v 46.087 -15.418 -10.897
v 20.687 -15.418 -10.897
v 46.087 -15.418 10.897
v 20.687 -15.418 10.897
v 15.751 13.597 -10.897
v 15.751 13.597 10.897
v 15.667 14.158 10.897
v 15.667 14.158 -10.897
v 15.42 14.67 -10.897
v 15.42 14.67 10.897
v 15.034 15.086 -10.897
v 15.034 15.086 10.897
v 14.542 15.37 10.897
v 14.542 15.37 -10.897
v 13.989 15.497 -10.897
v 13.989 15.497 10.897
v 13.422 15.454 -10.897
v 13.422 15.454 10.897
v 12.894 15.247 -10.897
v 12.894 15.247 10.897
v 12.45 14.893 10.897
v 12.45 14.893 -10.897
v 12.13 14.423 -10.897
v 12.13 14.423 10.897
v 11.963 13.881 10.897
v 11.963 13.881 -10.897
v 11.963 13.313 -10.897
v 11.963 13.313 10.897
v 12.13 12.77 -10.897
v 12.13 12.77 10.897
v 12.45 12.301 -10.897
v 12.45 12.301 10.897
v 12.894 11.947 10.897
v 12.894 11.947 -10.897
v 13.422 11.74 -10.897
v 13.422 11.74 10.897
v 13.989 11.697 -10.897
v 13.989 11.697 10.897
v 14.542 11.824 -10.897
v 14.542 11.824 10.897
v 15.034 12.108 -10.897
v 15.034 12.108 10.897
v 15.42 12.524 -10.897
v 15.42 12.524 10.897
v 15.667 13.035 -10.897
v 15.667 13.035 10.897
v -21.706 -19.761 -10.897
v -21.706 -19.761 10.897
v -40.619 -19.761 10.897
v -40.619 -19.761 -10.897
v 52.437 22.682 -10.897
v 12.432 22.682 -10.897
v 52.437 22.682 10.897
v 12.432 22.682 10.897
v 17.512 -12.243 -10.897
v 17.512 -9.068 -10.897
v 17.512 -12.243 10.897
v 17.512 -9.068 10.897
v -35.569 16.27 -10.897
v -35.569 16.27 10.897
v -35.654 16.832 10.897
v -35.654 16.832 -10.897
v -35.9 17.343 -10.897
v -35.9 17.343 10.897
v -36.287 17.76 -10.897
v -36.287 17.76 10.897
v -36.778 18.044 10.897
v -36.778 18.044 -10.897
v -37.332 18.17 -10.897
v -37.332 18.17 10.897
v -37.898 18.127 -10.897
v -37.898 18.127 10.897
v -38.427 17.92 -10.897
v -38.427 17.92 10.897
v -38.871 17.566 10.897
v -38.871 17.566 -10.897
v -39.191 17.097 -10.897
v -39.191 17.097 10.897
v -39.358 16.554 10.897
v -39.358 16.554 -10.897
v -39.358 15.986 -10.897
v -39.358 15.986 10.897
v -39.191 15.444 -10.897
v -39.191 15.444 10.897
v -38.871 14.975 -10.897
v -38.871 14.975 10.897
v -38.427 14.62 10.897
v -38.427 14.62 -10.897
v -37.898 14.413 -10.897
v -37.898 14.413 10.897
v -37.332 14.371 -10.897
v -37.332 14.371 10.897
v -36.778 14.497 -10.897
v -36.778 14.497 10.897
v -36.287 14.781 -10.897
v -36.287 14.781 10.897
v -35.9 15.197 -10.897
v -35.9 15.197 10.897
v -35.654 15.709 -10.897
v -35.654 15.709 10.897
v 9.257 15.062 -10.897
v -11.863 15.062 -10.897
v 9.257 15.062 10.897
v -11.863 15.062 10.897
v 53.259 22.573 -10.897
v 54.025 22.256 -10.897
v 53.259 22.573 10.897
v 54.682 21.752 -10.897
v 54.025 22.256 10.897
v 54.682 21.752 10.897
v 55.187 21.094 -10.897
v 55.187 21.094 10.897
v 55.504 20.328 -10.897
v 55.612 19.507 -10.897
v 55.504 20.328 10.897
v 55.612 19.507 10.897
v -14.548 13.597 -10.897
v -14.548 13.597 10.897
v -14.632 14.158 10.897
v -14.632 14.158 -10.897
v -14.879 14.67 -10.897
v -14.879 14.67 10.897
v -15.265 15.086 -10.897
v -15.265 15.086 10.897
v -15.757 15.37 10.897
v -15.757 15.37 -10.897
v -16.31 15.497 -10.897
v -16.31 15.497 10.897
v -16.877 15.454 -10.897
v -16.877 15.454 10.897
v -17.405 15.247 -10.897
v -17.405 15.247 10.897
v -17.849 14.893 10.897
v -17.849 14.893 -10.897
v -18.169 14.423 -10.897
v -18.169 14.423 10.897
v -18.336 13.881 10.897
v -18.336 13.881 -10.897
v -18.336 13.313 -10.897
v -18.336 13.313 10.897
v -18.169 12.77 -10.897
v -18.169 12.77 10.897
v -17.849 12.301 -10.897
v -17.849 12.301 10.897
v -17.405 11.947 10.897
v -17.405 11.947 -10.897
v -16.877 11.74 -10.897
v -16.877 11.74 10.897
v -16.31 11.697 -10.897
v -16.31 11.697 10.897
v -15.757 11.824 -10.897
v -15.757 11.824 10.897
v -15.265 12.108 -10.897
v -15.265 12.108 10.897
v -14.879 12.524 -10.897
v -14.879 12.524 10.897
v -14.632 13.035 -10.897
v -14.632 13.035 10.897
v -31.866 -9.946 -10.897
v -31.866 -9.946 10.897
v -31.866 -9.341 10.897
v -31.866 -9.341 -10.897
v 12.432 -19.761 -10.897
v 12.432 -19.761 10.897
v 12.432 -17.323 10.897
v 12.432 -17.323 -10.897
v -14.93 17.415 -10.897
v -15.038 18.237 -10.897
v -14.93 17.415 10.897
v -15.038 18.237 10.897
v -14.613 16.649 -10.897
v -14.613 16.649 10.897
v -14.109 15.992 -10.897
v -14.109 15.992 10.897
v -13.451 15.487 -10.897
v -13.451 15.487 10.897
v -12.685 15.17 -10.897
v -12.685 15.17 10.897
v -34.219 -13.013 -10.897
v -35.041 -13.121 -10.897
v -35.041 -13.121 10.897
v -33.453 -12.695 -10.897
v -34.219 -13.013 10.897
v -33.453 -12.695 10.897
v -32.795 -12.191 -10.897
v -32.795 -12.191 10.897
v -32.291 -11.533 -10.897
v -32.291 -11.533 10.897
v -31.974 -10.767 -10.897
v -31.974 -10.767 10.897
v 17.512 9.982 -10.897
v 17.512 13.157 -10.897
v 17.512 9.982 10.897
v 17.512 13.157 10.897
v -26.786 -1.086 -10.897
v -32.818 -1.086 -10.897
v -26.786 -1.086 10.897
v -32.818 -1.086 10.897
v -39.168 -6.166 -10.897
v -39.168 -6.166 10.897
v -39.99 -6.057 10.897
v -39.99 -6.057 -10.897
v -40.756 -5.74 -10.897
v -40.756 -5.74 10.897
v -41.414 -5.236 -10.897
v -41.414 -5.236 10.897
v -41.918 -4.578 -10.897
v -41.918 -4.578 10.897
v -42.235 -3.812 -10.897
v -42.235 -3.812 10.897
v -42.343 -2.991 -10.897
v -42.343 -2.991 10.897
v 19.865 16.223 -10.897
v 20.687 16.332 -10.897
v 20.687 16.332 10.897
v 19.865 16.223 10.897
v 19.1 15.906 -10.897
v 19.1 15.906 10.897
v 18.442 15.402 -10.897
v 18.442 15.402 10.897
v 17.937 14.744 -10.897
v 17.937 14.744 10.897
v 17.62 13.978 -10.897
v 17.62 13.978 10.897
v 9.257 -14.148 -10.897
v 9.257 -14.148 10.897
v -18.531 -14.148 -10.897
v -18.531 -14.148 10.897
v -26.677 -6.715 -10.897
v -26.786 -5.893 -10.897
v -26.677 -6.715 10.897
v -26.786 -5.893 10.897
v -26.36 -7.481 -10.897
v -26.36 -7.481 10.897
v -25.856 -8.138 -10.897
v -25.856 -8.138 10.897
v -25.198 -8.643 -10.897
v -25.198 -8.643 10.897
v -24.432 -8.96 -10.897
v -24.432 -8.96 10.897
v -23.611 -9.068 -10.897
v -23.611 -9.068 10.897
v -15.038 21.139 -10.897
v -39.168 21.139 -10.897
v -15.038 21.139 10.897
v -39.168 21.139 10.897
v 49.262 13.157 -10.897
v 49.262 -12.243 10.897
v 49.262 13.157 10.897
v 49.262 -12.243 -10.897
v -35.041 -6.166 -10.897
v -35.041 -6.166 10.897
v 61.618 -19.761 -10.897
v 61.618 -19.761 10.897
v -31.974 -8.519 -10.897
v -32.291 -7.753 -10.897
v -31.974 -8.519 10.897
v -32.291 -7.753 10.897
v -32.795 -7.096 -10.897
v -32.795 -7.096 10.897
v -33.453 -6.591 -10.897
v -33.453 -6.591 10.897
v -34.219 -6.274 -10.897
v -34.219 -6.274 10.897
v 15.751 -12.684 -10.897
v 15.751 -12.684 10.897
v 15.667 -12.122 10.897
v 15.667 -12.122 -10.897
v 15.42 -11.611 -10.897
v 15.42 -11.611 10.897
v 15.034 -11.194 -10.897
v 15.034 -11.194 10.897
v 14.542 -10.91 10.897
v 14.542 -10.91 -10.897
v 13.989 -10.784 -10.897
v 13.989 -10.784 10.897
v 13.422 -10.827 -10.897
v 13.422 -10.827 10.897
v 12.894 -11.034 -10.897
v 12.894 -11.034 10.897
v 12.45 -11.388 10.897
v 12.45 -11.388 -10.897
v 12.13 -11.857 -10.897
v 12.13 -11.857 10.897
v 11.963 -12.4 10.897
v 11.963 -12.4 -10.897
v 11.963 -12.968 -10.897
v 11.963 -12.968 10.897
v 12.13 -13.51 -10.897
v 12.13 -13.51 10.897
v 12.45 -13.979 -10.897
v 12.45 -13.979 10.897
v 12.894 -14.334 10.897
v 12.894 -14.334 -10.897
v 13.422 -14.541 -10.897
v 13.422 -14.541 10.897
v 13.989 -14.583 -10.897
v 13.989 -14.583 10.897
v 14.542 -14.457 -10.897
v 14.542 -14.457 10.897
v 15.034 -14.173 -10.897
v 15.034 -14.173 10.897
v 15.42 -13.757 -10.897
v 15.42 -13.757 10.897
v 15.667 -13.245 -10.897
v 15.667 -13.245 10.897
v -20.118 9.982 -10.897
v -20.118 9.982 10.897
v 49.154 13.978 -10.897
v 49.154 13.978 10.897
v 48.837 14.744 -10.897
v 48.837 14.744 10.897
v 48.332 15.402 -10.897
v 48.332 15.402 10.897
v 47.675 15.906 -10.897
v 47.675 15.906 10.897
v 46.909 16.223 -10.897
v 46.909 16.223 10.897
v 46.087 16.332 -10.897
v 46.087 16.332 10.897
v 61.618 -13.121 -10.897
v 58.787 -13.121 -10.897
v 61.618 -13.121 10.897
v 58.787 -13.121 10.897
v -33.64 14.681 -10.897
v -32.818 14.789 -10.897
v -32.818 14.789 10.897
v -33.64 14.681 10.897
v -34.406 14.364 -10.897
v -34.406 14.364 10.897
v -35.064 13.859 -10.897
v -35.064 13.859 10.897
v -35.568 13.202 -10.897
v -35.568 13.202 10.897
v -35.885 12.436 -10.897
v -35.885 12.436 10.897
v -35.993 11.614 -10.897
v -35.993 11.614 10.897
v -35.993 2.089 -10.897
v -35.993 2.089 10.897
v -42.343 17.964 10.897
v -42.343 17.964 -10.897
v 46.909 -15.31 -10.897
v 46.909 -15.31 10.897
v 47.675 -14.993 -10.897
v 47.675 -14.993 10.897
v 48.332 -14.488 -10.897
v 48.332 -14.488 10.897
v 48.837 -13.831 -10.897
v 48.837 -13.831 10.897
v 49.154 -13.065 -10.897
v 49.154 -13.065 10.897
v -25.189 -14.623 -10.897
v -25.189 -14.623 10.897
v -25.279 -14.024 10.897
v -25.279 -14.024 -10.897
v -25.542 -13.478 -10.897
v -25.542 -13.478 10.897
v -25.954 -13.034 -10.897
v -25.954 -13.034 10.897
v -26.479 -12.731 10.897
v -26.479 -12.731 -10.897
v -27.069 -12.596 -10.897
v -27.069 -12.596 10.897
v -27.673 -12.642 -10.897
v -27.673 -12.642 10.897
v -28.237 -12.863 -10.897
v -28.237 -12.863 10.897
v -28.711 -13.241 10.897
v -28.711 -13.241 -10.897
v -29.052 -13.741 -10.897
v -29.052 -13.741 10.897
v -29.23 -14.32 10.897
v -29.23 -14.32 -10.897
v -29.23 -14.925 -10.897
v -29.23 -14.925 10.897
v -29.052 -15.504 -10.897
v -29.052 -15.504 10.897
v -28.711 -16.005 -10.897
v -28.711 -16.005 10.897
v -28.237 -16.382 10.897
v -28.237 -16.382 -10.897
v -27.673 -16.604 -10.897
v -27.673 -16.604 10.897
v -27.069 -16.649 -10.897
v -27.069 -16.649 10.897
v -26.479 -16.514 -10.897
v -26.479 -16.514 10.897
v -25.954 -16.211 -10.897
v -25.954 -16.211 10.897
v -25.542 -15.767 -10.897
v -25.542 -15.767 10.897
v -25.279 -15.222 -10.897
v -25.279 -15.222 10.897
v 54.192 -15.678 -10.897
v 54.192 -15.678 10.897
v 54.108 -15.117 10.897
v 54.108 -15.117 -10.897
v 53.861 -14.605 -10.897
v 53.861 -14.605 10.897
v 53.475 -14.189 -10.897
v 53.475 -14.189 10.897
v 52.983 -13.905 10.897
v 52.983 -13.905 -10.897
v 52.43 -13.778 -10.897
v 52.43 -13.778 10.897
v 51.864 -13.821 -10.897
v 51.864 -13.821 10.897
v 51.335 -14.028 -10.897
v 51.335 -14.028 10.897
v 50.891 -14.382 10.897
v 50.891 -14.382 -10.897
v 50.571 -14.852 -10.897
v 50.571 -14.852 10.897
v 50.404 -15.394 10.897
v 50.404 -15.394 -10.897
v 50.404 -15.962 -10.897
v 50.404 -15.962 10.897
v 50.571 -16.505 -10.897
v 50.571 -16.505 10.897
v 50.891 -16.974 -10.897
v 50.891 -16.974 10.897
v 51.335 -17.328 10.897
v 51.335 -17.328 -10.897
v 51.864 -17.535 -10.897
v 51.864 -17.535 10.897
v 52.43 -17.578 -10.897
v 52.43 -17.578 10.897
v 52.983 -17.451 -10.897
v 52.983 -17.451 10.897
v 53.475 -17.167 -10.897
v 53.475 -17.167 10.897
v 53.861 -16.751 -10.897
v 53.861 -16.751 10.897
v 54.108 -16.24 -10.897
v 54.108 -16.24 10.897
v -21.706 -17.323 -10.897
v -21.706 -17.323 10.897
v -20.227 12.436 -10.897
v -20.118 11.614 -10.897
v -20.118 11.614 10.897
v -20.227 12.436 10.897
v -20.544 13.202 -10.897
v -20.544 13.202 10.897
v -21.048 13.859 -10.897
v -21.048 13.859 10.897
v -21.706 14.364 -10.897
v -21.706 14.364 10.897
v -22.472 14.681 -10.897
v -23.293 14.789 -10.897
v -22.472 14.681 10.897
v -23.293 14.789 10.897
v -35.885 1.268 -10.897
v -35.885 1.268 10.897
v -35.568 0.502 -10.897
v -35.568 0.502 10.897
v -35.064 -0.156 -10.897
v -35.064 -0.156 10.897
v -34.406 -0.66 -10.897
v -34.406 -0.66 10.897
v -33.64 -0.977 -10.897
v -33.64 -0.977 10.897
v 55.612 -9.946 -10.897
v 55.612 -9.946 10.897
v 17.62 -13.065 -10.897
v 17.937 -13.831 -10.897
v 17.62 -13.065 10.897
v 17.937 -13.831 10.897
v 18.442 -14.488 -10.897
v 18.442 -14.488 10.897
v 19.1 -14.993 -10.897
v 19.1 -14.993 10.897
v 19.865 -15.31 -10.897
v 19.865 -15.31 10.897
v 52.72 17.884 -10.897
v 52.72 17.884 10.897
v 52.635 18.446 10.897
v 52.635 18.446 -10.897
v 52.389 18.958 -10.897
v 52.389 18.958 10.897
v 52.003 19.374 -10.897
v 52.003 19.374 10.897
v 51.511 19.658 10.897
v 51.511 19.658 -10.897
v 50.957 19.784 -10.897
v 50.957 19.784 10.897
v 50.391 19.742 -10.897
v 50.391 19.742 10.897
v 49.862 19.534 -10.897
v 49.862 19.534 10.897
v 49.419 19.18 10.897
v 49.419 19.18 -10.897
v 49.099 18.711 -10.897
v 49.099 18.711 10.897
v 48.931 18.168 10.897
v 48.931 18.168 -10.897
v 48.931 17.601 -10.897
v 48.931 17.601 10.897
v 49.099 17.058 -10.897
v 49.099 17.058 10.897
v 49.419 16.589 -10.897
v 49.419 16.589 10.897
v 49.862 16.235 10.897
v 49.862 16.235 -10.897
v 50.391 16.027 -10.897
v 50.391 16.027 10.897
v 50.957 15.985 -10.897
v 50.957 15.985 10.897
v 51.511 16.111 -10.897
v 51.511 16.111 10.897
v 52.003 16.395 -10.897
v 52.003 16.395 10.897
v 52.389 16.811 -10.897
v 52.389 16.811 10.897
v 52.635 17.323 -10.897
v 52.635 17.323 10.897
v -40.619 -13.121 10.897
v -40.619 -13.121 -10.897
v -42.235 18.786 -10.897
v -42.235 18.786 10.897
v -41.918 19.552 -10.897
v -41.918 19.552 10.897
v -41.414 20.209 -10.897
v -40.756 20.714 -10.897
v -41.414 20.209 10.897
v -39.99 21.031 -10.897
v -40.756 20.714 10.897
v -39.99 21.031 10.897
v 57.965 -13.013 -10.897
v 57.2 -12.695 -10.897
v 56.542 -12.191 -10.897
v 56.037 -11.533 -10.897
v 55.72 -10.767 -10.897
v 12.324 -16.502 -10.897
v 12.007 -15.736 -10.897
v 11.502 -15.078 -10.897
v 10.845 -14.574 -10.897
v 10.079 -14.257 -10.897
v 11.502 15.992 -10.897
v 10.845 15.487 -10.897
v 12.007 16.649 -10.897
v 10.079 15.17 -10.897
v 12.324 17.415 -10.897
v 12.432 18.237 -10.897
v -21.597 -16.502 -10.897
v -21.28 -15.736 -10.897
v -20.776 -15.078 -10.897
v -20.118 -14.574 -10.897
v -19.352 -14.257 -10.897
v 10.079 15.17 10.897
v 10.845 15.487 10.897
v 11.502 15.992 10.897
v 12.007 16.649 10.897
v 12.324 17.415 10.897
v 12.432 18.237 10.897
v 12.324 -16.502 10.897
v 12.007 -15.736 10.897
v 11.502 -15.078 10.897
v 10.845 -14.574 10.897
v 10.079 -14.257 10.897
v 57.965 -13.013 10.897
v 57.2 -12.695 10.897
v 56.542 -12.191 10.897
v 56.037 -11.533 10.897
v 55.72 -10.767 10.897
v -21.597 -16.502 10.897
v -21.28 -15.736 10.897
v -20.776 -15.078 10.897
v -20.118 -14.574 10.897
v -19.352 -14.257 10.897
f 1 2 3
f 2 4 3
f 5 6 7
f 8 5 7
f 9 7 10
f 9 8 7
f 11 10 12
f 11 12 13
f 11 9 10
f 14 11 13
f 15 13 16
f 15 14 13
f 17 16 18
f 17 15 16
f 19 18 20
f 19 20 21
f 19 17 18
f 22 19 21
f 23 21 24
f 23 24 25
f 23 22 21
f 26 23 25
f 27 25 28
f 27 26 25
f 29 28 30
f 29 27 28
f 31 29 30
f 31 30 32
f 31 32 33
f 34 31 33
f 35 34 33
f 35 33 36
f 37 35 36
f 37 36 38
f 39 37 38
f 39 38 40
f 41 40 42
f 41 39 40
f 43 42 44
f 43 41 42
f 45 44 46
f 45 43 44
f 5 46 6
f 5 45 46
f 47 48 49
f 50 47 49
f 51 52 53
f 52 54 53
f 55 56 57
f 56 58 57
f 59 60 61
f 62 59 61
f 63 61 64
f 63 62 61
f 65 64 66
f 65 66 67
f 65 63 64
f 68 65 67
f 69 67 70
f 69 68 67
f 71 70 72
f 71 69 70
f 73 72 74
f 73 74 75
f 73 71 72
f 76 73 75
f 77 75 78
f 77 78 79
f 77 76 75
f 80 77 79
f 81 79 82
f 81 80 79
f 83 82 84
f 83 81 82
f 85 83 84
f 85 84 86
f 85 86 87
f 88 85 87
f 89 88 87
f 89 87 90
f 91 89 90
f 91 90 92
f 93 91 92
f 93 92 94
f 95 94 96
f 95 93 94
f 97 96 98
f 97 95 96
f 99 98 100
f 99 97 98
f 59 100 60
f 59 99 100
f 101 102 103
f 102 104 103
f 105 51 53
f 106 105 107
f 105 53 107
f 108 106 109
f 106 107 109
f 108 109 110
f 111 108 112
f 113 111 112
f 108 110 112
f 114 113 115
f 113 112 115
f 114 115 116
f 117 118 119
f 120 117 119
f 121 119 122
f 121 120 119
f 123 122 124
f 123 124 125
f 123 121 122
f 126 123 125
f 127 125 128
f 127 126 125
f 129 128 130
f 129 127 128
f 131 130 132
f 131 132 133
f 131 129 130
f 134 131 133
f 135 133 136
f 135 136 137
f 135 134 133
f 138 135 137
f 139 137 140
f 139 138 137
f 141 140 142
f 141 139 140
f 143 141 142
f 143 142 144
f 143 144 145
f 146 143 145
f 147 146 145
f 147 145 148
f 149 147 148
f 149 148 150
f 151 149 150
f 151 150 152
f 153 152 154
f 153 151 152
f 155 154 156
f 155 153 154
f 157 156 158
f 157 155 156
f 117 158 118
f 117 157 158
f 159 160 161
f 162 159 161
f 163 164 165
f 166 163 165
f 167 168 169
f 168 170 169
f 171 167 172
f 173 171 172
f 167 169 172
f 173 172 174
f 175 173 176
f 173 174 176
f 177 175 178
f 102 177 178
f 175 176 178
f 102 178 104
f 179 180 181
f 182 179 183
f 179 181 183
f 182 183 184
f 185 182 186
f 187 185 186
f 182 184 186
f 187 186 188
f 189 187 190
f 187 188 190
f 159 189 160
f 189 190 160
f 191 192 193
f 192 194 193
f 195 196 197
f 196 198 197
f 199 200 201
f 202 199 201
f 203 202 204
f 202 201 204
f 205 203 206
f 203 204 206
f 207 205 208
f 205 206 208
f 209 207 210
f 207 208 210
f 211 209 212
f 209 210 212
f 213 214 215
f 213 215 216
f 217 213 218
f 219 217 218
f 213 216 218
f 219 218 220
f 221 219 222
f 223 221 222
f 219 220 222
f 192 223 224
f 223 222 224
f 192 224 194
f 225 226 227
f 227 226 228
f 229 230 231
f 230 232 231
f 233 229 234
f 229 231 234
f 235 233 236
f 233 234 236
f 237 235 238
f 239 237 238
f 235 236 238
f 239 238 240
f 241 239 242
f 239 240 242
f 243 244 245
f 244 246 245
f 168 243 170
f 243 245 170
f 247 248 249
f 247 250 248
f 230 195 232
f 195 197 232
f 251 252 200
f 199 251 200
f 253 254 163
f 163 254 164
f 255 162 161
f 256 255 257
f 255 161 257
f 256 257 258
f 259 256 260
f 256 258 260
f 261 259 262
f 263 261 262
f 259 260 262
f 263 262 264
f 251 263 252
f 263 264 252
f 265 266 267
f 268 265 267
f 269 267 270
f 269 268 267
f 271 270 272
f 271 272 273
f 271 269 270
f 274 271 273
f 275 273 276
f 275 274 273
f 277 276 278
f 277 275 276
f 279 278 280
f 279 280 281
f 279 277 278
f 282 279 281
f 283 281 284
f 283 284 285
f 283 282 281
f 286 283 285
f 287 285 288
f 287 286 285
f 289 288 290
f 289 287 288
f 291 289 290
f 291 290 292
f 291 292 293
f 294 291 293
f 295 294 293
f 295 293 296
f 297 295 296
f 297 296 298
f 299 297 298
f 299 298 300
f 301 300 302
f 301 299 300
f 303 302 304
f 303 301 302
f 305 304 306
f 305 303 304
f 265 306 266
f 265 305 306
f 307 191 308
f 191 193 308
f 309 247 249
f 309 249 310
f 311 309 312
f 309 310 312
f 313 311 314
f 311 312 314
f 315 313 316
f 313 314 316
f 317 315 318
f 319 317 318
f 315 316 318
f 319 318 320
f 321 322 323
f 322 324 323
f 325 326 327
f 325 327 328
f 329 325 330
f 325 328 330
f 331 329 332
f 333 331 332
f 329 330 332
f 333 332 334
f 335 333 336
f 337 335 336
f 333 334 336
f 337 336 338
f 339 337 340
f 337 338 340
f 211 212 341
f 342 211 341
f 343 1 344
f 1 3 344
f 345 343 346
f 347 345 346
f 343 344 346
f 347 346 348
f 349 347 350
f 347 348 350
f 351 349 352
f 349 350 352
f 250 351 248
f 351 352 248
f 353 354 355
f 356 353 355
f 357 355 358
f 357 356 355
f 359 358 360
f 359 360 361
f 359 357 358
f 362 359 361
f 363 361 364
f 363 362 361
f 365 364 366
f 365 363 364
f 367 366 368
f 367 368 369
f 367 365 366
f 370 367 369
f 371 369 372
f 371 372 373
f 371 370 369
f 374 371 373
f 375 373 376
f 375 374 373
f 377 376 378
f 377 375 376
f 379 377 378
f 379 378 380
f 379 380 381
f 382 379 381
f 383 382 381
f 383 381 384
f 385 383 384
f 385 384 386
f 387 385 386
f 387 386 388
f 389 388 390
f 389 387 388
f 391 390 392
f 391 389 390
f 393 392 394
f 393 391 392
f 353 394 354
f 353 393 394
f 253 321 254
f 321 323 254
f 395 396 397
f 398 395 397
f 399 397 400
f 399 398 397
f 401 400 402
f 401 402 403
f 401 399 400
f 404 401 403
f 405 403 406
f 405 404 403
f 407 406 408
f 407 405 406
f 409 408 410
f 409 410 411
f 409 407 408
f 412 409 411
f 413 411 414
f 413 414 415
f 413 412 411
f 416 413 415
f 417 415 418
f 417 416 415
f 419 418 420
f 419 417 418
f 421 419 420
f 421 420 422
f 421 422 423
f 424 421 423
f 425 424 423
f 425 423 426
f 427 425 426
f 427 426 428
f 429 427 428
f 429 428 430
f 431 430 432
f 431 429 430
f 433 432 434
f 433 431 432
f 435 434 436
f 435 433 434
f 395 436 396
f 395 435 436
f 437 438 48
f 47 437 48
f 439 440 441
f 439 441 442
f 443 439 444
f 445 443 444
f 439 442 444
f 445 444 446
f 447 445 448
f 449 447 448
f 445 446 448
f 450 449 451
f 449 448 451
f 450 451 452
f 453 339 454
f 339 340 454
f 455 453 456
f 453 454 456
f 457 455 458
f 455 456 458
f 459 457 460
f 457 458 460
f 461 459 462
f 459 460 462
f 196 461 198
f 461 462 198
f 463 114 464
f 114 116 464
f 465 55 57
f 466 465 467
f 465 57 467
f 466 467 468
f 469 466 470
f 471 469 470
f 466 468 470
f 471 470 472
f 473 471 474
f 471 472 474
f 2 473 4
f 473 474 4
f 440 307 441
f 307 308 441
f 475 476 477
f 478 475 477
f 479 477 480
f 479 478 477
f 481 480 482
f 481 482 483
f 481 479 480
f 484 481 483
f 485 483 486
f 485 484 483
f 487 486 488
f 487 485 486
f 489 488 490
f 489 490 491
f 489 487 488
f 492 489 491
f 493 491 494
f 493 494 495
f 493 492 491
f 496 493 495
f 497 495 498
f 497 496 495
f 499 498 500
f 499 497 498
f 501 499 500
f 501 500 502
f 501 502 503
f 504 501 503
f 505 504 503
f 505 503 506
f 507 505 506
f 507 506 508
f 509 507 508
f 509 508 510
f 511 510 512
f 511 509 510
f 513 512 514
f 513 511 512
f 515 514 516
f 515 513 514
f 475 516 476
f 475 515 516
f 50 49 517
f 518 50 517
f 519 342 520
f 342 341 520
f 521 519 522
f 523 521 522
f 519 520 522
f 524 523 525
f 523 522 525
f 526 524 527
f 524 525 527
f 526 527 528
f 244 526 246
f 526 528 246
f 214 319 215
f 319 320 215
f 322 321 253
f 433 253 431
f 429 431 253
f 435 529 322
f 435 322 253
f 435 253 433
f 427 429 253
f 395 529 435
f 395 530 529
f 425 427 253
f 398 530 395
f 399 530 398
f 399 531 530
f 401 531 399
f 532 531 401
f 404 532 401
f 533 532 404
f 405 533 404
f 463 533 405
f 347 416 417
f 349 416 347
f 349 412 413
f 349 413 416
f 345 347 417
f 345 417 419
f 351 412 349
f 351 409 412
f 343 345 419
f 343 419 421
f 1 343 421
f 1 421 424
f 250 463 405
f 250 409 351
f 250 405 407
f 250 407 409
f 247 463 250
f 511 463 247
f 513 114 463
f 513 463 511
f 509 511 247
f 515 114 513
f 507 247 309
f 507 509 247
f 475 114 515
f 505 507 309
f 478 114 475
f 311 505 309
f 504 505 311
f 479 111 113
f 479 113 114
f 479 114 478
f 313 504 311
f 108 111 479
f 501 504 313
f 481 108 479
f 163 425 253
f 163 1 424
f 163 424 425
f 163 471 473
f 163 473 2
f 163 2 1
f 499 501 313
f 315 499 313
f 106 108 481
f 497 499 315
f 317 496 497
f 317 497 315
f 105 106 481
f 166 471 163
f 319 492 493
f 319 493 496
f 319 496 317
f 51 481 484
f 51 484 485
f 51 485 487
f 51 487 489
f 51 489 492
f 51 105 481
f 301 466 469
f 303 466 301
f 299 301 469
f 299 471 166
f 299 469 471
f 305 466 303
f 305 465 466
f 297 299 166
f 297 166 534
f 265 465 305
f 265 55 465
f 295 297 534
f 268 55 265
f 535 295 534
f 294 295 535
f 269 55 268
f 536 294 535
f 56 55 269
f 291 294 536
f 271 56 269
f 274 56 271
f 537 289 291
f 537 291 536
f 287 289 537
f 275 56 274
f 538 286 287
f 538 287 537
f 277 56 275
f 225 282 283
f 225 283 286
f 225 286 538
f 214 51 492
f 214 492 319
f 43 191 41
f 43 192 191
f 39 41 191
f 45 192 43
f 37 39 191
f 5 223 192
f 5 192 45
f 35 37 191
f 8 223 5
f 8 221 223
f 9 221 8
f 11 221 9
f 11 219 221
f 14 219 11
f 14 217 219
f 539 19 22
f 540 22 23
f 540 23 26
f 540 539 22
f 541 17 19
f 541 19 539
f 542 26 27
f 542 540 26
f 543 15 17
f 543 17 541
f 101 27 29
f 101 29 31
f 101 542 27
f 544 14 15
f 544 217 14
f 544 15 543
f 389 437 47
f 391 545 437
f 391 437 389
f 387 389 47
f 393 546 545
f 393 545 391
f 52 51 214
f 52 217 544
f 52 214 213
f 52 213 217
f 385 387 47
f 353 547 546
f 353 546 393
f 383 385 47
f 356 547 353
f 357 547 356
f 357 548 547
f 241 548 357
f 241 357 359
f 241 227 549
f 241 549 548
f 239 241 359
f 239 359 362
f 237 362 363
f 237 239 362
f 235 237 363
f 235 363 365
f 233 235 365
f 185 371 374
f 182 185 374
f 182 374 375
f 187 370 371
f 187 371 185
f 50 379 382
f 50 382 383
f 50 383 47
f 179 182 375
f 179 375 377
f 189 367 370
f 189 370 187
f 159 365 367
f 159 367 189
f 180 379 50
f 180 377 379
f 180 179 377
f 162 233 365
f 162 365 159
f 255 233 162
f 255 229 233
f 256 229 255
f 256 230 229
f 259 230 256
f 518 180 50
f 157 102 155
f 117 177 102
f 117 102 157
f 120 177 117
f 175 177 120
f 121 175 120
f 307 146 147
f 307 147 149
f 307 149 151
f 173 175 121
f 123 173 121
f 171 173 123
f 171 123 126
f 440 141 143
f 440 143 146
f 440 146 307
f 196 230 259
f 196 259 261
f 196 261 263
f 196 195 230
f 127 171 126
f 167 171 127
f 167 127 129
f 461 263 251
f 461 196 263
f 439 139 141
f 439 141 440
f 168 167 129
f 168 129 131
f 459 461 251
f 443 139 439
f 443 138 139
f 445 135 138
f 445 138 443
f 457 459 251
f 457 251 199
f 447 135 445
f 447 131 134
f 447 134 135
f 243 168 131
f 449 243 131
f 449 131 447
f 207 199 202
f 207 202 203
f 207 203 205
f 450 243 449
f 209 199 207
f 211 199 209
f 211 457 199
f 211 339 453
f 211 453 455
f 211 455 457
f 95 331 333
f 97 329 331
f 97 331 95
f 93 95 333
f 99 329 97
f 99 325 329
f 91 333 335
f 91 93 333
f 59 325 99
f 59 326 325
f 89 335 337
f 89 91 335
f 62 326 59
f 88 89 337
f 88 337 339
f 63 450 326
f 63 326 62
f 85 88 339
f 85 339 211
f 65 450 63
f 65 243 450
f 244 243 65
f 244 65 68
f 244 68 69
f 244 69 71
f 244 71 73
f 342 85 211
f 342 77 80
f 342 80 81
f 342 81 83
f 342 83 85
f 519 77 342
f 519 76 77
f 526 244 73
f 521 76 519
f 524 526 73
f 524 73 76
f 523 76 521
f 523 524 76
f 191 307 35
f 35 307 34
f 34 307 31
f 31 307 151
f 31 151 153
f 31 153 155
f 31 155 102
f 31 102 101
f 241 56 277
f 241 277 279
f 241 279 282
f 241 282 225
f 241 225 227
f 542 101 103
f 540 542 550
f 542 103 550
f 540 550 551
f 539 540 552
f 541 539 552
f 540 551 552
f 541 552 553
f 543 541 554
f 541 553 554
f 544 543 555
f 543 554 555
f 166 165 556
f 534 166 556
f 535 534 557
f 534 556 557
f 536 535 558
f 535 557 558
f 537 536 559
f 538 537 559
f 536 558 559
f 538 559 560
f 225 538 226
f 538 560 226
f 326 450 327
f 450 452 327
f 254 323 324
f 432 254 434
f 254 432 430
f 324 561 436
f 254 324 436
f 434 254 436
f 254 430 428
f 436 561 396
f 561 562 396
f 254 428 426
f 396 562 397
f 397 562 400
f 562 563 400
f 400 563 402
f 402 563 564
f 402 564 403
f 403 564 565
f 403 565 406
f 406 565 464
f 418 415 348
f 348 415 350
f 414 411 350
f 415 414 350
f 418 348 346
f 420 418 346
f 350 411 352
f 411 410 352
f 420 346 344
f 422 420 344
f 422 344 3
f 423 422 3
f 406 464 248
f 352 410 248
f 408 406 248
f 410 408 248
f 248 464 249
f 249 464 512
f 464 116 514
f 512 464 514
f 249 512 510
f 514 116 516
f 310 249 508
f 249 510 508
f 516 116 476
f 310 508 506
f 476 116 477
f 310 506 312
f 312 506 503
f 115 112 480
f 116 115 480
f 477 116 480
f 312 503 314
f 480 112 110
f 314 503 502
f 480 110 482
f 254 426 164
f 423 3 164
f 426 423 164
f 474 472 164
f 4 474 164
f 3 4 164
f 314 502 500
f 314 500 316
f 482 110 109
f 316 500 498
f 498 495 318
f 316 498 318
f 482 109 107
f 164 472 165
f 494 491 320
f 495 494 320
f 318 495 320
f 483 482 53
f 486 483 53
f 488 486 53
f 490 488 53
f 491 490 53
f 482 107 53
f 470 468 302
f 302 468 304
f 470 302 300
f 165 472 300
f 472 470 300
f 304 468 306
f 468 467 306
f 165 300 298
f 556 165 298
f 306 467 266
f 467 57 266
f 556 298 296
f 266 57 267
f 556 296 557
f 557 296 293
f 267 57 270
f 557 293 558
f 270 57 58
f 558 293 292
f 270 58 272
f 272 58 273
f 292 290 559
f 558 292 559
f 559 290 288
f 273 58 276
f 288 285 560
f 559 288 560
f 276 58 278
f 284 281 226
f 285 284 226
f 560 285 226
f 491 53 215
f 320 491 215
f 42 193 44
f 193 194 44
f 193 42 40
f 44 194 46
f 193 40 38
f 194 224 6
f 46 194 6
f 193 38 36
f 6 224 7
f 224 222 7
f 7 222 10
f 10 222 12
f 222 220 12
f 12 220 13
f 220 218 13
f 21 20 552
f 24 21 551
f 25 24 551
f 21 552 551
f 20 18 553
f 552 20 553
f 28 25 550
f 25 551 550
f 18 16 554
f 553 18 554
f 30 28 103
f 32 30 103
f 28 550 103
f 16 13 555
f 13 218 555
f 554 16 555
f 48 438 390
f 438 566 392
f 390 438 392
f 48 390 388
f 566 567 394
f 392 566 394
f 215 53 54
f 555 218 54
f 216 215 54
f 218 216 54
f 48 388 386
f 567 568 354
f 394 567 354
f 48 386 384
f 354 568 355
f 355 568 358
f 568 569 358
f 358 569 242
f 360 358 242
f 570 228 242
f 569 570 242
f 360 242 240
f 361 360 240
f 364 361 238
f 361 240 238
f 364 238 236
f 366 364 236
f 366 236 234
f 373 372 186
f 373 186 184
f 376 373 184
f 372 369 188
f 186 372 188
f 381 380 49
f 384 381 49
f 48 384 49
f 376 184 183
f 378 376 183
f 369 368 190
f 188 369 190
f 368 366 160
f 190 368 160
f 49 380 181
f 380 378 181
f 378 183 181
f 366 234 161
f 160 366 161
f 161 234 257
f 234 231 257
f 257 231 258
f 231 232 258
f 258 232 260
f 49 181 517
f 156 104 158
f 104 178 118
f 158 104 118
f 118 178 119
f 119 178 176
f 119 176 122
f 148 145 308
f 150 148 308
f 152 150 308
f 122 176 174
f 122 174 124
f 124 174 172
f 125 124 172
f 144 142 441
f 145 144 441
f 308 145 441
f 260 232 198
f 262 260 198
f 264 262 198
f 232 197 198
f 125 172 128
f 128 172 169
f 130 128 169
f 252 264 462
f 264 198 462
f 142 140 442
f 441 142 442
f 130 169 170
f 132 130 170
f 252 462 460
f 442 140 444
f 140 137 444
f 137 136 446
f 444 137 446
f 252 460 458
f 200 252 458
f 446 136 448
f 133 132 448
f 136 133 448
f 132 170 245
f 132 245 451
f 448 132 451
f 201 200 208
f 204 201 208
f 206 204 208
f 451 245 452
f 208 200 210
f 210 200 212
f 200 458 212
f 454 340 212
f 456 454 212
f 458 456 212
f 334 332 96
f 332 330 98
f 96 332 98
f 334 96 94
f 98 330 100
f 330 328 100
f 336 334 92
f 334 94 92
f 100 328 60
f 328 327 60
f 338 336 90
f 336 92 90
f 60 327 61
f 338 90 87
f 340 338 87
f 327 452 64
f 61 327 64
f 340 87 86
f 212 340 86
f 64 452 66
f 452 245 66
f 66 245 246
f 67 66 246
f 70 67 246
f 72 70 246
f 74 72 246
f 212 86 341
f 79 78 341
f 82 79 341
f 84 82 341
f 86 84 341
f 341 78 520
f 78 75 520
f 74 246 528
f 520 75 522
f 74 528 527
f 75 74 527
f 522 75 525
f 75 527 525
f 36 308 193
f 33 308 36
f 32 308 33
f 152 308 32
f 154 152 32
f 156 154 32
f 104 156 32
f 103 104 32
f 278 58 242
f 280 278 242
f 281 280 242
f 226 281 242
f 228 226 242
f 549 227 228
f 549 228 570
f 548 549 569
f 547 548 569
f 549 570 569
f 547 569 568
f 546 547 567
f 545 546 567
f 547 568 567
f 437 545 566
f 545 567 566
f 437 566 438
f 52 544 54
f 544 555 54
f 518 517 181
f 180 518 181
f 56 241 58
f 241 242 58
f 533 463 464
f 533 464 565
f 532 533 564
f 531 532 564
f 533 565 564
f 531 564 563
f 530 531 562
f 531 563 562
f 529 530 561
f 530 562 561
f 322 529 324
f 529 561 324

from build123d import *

# Parameters (mm, degrees)
SKETCH4_R      = 2.031992692
SKETCH4_R_2    = 1.905
EXTRUDE3_DEPTH = 10.8966


with BuildPart() as part:
    # Sketch4 → Extrude3 (new, symmetric)
    with BuildSketch(Plane.XY):
        with BuildLine():
            Line((-42.343481517, -2.990600597), (-42.343481517, 17.964399403))
            ThreePointArc((-42.343481517, 17.964399403), (-41.413545547, 20.209463433), (-39.168481517, 21.139399403))
            Line((-39.168481517, 21.139399403), (-15.038481517, 21.139399403))
            Line((-15.038481517, 21.139399403), (-15.038481517, 18.236569756))
            ThreePointArc((-15.038481517, 18.236569756), (-14.108545547, 15.991505726), (-11.863481517, 15.061569756))
            Line((-11.863481517, 15.061569756), (9.257081626, 15.061569756))
            ThreePointArc((9.257081626, 15.061569756), (11.502145656, 15.991505726), (12.432081626, 18.236569756))
            Line((12.432081626, 18.236569756), (12.432081626, 22.681569756))
            Line((12.432081626, 22.681569756), (52.437081626, 22.681569756))
            ThreePointArc((52.437081626, 22.681569756), (54.682145656, 21.751633786), (55.612081626, 19.506569756))
            Line((55.612081626, 19.506569756), (55.612081626, -9.945714332))
            ThreePointArc((55.612081626, -9.945714332), (56.542017596, -12.190778362), (58.787081626, -13.120714332))
            Line((58.787081626, -13.120714332), (61.618454053, -13.120714332))
            Line((61.618454053, -13.120714332), (61.618454053, -19.76149571))
            Line((61.618454053, -19.76149571), (12.432081626, -19.76149571))
            Line((12.432081626, -19.76149571), (12.432081626, -17.323430244))
            ThreePointArc((12.432081626, -17.323430244), (11.502145656, -15.078366214), (9.257081626, -14.148430244))
            Line((9.257081626, -14.148430244), (-18.530518374, -14.148430244))
            ThreePointArc((-18.530518374, -14.148430244), (-20.775582404, -15.078366214), (-21.705518374, -17.323430244))
            Line((-21.705518374, -17.323430244), (-21.705518374, -19.76149571))
            Line((-21.705518374, -19.76149571), (-40.618560355, -19.76149571))
            Line((-40.618560355, -19.76149571), (-40.618560355, -13.120714332))
            Line((-40.618560355, -13.120714332), (-35.040518374, -13.120714332))
            ThreePointArc((-35.040518374, -13.120714332), (-32.795454344, -12.190778362), (-31.865518374, -9.945714332))
            Line((-31.865518374, -9.945714332), (-31.865518374, -9.340600597))
            ThreePointArc((-31.865518374, -9.340600597), (-32.795454344, -7.095536567), (-35.040518374, -6.165600597))
            Line((-35.040518374, -6.165600597), (-39.168481517, -6.165600597))
            ThreePointArc((-39.168481517, -6.165600597), (-41.413545547, -5.235664628), (-42.343481517, -2.990600597))
        make_face()
        with Locations((-27.221195322, -14.622613425)):
            Circle(SKETCH4_R, mode=Mode.SUBTRACT)
        with Locations((52.287415303, -15.678066597)):
            Circle(SKETCH4_R_2, mode=Mode.SUBTRACT)
        with Locations((13.846294556, -12.683763681)):
            Circle(SKETCH4_R_2, mode=Mode.SUBTRACT)
        with Locations((13.846294556, 13.596903192)):
            Circle(SKETCH4_R_2, mode=Mode.SUBTRACT)
        with Locations((-37.474326825, 16.270244711)):
            Circle(SKETCH4_R_2, mode=Mode.SUBTRACT)
        with Locations((-16.452694446, 13.596903192)):
            Circle(SKETCH4_R_2, mode=Mode.SUBTRACT)
        with Locations((50.814973838, 17.884461968)):
            Circle(SKETCH4_R_2, mode=Mode.SUBTRACT)
        with BuildLine():
            Line((49.262081626, -12.243430244), (49.262081626, 13.156569756))
            ThreePointArc((49.262081626, 13.156569756), (48.332145656, 15.401633786), (46.087081626, 16.331569756))
            Line((46.087081626, 16.331569756), (20.687081626, 16.331569756))
            ThreePointArc((20.687081626, 16.331569756), (18.442017596, 15.401633786), (17.512081626, 13.156569756))
            Line((17.512081626, 13.156569756), (17.512081626, 9.981569756))
            Line((17.512081626, 9.981569756), (-20.118481517, 9.981569756))
            Line((-20.118481517, 9.981569756), (-20.118481517, 11.614399403))
            ThreePointArc((-20.118481517, 11.614399403), (-21.048417487, 13.859463433), (-23.293481517, 14.789399403))
            Line((-23.293481517, 14.789399403), (-32.818481517, 14.789399403))
            ThreePointArc((-32.818481517, 14.789399403), (-35.063545547, 13.859463433), (-35.993481517, 11.614399403))
            Line((-35.993481517, 11.614399403), (-35.993481517, 2.089399403))
            ThreePointArc((-35.993481517, 2.089399403), (-35.063545547, -0.155664628), (-32.818481517, -1.085600597))
            Line((-32.818481517, -1.085600597), (-26.785518374, -1.085600597))
            Line((-26.785518374, -1.085600597), (-26.785518374, -5.893430244))
            ThreePointArc((-26.785518374, -5.893430244), (-25.855582404, -8.138494274), (-23.610518374, -9.068430244))
            Line((-23.610518374, -9.068430244), (17.512081626, -9.068430244))
            Line((17.512081626, -9.068430244), (17.512081626, -12.243430244))
            ThreePointArc((17.512081626, -12.243430244), (18.442017596, -14.488494274), (20.687081626, -15.418430244))
            Line((20.687081626, -15.418430244), (46.087081626, -15.418430244))
            ThreePointArc((46.087081626, -15.418430244), (48.332145656, -14.488494274), (49.262081626, -12.243430244))
        make_face(mode=Mode.SUBTRACT)
    extrude(amount=EXTRUDE3_DEPTH, both=True)


solid = part.part
